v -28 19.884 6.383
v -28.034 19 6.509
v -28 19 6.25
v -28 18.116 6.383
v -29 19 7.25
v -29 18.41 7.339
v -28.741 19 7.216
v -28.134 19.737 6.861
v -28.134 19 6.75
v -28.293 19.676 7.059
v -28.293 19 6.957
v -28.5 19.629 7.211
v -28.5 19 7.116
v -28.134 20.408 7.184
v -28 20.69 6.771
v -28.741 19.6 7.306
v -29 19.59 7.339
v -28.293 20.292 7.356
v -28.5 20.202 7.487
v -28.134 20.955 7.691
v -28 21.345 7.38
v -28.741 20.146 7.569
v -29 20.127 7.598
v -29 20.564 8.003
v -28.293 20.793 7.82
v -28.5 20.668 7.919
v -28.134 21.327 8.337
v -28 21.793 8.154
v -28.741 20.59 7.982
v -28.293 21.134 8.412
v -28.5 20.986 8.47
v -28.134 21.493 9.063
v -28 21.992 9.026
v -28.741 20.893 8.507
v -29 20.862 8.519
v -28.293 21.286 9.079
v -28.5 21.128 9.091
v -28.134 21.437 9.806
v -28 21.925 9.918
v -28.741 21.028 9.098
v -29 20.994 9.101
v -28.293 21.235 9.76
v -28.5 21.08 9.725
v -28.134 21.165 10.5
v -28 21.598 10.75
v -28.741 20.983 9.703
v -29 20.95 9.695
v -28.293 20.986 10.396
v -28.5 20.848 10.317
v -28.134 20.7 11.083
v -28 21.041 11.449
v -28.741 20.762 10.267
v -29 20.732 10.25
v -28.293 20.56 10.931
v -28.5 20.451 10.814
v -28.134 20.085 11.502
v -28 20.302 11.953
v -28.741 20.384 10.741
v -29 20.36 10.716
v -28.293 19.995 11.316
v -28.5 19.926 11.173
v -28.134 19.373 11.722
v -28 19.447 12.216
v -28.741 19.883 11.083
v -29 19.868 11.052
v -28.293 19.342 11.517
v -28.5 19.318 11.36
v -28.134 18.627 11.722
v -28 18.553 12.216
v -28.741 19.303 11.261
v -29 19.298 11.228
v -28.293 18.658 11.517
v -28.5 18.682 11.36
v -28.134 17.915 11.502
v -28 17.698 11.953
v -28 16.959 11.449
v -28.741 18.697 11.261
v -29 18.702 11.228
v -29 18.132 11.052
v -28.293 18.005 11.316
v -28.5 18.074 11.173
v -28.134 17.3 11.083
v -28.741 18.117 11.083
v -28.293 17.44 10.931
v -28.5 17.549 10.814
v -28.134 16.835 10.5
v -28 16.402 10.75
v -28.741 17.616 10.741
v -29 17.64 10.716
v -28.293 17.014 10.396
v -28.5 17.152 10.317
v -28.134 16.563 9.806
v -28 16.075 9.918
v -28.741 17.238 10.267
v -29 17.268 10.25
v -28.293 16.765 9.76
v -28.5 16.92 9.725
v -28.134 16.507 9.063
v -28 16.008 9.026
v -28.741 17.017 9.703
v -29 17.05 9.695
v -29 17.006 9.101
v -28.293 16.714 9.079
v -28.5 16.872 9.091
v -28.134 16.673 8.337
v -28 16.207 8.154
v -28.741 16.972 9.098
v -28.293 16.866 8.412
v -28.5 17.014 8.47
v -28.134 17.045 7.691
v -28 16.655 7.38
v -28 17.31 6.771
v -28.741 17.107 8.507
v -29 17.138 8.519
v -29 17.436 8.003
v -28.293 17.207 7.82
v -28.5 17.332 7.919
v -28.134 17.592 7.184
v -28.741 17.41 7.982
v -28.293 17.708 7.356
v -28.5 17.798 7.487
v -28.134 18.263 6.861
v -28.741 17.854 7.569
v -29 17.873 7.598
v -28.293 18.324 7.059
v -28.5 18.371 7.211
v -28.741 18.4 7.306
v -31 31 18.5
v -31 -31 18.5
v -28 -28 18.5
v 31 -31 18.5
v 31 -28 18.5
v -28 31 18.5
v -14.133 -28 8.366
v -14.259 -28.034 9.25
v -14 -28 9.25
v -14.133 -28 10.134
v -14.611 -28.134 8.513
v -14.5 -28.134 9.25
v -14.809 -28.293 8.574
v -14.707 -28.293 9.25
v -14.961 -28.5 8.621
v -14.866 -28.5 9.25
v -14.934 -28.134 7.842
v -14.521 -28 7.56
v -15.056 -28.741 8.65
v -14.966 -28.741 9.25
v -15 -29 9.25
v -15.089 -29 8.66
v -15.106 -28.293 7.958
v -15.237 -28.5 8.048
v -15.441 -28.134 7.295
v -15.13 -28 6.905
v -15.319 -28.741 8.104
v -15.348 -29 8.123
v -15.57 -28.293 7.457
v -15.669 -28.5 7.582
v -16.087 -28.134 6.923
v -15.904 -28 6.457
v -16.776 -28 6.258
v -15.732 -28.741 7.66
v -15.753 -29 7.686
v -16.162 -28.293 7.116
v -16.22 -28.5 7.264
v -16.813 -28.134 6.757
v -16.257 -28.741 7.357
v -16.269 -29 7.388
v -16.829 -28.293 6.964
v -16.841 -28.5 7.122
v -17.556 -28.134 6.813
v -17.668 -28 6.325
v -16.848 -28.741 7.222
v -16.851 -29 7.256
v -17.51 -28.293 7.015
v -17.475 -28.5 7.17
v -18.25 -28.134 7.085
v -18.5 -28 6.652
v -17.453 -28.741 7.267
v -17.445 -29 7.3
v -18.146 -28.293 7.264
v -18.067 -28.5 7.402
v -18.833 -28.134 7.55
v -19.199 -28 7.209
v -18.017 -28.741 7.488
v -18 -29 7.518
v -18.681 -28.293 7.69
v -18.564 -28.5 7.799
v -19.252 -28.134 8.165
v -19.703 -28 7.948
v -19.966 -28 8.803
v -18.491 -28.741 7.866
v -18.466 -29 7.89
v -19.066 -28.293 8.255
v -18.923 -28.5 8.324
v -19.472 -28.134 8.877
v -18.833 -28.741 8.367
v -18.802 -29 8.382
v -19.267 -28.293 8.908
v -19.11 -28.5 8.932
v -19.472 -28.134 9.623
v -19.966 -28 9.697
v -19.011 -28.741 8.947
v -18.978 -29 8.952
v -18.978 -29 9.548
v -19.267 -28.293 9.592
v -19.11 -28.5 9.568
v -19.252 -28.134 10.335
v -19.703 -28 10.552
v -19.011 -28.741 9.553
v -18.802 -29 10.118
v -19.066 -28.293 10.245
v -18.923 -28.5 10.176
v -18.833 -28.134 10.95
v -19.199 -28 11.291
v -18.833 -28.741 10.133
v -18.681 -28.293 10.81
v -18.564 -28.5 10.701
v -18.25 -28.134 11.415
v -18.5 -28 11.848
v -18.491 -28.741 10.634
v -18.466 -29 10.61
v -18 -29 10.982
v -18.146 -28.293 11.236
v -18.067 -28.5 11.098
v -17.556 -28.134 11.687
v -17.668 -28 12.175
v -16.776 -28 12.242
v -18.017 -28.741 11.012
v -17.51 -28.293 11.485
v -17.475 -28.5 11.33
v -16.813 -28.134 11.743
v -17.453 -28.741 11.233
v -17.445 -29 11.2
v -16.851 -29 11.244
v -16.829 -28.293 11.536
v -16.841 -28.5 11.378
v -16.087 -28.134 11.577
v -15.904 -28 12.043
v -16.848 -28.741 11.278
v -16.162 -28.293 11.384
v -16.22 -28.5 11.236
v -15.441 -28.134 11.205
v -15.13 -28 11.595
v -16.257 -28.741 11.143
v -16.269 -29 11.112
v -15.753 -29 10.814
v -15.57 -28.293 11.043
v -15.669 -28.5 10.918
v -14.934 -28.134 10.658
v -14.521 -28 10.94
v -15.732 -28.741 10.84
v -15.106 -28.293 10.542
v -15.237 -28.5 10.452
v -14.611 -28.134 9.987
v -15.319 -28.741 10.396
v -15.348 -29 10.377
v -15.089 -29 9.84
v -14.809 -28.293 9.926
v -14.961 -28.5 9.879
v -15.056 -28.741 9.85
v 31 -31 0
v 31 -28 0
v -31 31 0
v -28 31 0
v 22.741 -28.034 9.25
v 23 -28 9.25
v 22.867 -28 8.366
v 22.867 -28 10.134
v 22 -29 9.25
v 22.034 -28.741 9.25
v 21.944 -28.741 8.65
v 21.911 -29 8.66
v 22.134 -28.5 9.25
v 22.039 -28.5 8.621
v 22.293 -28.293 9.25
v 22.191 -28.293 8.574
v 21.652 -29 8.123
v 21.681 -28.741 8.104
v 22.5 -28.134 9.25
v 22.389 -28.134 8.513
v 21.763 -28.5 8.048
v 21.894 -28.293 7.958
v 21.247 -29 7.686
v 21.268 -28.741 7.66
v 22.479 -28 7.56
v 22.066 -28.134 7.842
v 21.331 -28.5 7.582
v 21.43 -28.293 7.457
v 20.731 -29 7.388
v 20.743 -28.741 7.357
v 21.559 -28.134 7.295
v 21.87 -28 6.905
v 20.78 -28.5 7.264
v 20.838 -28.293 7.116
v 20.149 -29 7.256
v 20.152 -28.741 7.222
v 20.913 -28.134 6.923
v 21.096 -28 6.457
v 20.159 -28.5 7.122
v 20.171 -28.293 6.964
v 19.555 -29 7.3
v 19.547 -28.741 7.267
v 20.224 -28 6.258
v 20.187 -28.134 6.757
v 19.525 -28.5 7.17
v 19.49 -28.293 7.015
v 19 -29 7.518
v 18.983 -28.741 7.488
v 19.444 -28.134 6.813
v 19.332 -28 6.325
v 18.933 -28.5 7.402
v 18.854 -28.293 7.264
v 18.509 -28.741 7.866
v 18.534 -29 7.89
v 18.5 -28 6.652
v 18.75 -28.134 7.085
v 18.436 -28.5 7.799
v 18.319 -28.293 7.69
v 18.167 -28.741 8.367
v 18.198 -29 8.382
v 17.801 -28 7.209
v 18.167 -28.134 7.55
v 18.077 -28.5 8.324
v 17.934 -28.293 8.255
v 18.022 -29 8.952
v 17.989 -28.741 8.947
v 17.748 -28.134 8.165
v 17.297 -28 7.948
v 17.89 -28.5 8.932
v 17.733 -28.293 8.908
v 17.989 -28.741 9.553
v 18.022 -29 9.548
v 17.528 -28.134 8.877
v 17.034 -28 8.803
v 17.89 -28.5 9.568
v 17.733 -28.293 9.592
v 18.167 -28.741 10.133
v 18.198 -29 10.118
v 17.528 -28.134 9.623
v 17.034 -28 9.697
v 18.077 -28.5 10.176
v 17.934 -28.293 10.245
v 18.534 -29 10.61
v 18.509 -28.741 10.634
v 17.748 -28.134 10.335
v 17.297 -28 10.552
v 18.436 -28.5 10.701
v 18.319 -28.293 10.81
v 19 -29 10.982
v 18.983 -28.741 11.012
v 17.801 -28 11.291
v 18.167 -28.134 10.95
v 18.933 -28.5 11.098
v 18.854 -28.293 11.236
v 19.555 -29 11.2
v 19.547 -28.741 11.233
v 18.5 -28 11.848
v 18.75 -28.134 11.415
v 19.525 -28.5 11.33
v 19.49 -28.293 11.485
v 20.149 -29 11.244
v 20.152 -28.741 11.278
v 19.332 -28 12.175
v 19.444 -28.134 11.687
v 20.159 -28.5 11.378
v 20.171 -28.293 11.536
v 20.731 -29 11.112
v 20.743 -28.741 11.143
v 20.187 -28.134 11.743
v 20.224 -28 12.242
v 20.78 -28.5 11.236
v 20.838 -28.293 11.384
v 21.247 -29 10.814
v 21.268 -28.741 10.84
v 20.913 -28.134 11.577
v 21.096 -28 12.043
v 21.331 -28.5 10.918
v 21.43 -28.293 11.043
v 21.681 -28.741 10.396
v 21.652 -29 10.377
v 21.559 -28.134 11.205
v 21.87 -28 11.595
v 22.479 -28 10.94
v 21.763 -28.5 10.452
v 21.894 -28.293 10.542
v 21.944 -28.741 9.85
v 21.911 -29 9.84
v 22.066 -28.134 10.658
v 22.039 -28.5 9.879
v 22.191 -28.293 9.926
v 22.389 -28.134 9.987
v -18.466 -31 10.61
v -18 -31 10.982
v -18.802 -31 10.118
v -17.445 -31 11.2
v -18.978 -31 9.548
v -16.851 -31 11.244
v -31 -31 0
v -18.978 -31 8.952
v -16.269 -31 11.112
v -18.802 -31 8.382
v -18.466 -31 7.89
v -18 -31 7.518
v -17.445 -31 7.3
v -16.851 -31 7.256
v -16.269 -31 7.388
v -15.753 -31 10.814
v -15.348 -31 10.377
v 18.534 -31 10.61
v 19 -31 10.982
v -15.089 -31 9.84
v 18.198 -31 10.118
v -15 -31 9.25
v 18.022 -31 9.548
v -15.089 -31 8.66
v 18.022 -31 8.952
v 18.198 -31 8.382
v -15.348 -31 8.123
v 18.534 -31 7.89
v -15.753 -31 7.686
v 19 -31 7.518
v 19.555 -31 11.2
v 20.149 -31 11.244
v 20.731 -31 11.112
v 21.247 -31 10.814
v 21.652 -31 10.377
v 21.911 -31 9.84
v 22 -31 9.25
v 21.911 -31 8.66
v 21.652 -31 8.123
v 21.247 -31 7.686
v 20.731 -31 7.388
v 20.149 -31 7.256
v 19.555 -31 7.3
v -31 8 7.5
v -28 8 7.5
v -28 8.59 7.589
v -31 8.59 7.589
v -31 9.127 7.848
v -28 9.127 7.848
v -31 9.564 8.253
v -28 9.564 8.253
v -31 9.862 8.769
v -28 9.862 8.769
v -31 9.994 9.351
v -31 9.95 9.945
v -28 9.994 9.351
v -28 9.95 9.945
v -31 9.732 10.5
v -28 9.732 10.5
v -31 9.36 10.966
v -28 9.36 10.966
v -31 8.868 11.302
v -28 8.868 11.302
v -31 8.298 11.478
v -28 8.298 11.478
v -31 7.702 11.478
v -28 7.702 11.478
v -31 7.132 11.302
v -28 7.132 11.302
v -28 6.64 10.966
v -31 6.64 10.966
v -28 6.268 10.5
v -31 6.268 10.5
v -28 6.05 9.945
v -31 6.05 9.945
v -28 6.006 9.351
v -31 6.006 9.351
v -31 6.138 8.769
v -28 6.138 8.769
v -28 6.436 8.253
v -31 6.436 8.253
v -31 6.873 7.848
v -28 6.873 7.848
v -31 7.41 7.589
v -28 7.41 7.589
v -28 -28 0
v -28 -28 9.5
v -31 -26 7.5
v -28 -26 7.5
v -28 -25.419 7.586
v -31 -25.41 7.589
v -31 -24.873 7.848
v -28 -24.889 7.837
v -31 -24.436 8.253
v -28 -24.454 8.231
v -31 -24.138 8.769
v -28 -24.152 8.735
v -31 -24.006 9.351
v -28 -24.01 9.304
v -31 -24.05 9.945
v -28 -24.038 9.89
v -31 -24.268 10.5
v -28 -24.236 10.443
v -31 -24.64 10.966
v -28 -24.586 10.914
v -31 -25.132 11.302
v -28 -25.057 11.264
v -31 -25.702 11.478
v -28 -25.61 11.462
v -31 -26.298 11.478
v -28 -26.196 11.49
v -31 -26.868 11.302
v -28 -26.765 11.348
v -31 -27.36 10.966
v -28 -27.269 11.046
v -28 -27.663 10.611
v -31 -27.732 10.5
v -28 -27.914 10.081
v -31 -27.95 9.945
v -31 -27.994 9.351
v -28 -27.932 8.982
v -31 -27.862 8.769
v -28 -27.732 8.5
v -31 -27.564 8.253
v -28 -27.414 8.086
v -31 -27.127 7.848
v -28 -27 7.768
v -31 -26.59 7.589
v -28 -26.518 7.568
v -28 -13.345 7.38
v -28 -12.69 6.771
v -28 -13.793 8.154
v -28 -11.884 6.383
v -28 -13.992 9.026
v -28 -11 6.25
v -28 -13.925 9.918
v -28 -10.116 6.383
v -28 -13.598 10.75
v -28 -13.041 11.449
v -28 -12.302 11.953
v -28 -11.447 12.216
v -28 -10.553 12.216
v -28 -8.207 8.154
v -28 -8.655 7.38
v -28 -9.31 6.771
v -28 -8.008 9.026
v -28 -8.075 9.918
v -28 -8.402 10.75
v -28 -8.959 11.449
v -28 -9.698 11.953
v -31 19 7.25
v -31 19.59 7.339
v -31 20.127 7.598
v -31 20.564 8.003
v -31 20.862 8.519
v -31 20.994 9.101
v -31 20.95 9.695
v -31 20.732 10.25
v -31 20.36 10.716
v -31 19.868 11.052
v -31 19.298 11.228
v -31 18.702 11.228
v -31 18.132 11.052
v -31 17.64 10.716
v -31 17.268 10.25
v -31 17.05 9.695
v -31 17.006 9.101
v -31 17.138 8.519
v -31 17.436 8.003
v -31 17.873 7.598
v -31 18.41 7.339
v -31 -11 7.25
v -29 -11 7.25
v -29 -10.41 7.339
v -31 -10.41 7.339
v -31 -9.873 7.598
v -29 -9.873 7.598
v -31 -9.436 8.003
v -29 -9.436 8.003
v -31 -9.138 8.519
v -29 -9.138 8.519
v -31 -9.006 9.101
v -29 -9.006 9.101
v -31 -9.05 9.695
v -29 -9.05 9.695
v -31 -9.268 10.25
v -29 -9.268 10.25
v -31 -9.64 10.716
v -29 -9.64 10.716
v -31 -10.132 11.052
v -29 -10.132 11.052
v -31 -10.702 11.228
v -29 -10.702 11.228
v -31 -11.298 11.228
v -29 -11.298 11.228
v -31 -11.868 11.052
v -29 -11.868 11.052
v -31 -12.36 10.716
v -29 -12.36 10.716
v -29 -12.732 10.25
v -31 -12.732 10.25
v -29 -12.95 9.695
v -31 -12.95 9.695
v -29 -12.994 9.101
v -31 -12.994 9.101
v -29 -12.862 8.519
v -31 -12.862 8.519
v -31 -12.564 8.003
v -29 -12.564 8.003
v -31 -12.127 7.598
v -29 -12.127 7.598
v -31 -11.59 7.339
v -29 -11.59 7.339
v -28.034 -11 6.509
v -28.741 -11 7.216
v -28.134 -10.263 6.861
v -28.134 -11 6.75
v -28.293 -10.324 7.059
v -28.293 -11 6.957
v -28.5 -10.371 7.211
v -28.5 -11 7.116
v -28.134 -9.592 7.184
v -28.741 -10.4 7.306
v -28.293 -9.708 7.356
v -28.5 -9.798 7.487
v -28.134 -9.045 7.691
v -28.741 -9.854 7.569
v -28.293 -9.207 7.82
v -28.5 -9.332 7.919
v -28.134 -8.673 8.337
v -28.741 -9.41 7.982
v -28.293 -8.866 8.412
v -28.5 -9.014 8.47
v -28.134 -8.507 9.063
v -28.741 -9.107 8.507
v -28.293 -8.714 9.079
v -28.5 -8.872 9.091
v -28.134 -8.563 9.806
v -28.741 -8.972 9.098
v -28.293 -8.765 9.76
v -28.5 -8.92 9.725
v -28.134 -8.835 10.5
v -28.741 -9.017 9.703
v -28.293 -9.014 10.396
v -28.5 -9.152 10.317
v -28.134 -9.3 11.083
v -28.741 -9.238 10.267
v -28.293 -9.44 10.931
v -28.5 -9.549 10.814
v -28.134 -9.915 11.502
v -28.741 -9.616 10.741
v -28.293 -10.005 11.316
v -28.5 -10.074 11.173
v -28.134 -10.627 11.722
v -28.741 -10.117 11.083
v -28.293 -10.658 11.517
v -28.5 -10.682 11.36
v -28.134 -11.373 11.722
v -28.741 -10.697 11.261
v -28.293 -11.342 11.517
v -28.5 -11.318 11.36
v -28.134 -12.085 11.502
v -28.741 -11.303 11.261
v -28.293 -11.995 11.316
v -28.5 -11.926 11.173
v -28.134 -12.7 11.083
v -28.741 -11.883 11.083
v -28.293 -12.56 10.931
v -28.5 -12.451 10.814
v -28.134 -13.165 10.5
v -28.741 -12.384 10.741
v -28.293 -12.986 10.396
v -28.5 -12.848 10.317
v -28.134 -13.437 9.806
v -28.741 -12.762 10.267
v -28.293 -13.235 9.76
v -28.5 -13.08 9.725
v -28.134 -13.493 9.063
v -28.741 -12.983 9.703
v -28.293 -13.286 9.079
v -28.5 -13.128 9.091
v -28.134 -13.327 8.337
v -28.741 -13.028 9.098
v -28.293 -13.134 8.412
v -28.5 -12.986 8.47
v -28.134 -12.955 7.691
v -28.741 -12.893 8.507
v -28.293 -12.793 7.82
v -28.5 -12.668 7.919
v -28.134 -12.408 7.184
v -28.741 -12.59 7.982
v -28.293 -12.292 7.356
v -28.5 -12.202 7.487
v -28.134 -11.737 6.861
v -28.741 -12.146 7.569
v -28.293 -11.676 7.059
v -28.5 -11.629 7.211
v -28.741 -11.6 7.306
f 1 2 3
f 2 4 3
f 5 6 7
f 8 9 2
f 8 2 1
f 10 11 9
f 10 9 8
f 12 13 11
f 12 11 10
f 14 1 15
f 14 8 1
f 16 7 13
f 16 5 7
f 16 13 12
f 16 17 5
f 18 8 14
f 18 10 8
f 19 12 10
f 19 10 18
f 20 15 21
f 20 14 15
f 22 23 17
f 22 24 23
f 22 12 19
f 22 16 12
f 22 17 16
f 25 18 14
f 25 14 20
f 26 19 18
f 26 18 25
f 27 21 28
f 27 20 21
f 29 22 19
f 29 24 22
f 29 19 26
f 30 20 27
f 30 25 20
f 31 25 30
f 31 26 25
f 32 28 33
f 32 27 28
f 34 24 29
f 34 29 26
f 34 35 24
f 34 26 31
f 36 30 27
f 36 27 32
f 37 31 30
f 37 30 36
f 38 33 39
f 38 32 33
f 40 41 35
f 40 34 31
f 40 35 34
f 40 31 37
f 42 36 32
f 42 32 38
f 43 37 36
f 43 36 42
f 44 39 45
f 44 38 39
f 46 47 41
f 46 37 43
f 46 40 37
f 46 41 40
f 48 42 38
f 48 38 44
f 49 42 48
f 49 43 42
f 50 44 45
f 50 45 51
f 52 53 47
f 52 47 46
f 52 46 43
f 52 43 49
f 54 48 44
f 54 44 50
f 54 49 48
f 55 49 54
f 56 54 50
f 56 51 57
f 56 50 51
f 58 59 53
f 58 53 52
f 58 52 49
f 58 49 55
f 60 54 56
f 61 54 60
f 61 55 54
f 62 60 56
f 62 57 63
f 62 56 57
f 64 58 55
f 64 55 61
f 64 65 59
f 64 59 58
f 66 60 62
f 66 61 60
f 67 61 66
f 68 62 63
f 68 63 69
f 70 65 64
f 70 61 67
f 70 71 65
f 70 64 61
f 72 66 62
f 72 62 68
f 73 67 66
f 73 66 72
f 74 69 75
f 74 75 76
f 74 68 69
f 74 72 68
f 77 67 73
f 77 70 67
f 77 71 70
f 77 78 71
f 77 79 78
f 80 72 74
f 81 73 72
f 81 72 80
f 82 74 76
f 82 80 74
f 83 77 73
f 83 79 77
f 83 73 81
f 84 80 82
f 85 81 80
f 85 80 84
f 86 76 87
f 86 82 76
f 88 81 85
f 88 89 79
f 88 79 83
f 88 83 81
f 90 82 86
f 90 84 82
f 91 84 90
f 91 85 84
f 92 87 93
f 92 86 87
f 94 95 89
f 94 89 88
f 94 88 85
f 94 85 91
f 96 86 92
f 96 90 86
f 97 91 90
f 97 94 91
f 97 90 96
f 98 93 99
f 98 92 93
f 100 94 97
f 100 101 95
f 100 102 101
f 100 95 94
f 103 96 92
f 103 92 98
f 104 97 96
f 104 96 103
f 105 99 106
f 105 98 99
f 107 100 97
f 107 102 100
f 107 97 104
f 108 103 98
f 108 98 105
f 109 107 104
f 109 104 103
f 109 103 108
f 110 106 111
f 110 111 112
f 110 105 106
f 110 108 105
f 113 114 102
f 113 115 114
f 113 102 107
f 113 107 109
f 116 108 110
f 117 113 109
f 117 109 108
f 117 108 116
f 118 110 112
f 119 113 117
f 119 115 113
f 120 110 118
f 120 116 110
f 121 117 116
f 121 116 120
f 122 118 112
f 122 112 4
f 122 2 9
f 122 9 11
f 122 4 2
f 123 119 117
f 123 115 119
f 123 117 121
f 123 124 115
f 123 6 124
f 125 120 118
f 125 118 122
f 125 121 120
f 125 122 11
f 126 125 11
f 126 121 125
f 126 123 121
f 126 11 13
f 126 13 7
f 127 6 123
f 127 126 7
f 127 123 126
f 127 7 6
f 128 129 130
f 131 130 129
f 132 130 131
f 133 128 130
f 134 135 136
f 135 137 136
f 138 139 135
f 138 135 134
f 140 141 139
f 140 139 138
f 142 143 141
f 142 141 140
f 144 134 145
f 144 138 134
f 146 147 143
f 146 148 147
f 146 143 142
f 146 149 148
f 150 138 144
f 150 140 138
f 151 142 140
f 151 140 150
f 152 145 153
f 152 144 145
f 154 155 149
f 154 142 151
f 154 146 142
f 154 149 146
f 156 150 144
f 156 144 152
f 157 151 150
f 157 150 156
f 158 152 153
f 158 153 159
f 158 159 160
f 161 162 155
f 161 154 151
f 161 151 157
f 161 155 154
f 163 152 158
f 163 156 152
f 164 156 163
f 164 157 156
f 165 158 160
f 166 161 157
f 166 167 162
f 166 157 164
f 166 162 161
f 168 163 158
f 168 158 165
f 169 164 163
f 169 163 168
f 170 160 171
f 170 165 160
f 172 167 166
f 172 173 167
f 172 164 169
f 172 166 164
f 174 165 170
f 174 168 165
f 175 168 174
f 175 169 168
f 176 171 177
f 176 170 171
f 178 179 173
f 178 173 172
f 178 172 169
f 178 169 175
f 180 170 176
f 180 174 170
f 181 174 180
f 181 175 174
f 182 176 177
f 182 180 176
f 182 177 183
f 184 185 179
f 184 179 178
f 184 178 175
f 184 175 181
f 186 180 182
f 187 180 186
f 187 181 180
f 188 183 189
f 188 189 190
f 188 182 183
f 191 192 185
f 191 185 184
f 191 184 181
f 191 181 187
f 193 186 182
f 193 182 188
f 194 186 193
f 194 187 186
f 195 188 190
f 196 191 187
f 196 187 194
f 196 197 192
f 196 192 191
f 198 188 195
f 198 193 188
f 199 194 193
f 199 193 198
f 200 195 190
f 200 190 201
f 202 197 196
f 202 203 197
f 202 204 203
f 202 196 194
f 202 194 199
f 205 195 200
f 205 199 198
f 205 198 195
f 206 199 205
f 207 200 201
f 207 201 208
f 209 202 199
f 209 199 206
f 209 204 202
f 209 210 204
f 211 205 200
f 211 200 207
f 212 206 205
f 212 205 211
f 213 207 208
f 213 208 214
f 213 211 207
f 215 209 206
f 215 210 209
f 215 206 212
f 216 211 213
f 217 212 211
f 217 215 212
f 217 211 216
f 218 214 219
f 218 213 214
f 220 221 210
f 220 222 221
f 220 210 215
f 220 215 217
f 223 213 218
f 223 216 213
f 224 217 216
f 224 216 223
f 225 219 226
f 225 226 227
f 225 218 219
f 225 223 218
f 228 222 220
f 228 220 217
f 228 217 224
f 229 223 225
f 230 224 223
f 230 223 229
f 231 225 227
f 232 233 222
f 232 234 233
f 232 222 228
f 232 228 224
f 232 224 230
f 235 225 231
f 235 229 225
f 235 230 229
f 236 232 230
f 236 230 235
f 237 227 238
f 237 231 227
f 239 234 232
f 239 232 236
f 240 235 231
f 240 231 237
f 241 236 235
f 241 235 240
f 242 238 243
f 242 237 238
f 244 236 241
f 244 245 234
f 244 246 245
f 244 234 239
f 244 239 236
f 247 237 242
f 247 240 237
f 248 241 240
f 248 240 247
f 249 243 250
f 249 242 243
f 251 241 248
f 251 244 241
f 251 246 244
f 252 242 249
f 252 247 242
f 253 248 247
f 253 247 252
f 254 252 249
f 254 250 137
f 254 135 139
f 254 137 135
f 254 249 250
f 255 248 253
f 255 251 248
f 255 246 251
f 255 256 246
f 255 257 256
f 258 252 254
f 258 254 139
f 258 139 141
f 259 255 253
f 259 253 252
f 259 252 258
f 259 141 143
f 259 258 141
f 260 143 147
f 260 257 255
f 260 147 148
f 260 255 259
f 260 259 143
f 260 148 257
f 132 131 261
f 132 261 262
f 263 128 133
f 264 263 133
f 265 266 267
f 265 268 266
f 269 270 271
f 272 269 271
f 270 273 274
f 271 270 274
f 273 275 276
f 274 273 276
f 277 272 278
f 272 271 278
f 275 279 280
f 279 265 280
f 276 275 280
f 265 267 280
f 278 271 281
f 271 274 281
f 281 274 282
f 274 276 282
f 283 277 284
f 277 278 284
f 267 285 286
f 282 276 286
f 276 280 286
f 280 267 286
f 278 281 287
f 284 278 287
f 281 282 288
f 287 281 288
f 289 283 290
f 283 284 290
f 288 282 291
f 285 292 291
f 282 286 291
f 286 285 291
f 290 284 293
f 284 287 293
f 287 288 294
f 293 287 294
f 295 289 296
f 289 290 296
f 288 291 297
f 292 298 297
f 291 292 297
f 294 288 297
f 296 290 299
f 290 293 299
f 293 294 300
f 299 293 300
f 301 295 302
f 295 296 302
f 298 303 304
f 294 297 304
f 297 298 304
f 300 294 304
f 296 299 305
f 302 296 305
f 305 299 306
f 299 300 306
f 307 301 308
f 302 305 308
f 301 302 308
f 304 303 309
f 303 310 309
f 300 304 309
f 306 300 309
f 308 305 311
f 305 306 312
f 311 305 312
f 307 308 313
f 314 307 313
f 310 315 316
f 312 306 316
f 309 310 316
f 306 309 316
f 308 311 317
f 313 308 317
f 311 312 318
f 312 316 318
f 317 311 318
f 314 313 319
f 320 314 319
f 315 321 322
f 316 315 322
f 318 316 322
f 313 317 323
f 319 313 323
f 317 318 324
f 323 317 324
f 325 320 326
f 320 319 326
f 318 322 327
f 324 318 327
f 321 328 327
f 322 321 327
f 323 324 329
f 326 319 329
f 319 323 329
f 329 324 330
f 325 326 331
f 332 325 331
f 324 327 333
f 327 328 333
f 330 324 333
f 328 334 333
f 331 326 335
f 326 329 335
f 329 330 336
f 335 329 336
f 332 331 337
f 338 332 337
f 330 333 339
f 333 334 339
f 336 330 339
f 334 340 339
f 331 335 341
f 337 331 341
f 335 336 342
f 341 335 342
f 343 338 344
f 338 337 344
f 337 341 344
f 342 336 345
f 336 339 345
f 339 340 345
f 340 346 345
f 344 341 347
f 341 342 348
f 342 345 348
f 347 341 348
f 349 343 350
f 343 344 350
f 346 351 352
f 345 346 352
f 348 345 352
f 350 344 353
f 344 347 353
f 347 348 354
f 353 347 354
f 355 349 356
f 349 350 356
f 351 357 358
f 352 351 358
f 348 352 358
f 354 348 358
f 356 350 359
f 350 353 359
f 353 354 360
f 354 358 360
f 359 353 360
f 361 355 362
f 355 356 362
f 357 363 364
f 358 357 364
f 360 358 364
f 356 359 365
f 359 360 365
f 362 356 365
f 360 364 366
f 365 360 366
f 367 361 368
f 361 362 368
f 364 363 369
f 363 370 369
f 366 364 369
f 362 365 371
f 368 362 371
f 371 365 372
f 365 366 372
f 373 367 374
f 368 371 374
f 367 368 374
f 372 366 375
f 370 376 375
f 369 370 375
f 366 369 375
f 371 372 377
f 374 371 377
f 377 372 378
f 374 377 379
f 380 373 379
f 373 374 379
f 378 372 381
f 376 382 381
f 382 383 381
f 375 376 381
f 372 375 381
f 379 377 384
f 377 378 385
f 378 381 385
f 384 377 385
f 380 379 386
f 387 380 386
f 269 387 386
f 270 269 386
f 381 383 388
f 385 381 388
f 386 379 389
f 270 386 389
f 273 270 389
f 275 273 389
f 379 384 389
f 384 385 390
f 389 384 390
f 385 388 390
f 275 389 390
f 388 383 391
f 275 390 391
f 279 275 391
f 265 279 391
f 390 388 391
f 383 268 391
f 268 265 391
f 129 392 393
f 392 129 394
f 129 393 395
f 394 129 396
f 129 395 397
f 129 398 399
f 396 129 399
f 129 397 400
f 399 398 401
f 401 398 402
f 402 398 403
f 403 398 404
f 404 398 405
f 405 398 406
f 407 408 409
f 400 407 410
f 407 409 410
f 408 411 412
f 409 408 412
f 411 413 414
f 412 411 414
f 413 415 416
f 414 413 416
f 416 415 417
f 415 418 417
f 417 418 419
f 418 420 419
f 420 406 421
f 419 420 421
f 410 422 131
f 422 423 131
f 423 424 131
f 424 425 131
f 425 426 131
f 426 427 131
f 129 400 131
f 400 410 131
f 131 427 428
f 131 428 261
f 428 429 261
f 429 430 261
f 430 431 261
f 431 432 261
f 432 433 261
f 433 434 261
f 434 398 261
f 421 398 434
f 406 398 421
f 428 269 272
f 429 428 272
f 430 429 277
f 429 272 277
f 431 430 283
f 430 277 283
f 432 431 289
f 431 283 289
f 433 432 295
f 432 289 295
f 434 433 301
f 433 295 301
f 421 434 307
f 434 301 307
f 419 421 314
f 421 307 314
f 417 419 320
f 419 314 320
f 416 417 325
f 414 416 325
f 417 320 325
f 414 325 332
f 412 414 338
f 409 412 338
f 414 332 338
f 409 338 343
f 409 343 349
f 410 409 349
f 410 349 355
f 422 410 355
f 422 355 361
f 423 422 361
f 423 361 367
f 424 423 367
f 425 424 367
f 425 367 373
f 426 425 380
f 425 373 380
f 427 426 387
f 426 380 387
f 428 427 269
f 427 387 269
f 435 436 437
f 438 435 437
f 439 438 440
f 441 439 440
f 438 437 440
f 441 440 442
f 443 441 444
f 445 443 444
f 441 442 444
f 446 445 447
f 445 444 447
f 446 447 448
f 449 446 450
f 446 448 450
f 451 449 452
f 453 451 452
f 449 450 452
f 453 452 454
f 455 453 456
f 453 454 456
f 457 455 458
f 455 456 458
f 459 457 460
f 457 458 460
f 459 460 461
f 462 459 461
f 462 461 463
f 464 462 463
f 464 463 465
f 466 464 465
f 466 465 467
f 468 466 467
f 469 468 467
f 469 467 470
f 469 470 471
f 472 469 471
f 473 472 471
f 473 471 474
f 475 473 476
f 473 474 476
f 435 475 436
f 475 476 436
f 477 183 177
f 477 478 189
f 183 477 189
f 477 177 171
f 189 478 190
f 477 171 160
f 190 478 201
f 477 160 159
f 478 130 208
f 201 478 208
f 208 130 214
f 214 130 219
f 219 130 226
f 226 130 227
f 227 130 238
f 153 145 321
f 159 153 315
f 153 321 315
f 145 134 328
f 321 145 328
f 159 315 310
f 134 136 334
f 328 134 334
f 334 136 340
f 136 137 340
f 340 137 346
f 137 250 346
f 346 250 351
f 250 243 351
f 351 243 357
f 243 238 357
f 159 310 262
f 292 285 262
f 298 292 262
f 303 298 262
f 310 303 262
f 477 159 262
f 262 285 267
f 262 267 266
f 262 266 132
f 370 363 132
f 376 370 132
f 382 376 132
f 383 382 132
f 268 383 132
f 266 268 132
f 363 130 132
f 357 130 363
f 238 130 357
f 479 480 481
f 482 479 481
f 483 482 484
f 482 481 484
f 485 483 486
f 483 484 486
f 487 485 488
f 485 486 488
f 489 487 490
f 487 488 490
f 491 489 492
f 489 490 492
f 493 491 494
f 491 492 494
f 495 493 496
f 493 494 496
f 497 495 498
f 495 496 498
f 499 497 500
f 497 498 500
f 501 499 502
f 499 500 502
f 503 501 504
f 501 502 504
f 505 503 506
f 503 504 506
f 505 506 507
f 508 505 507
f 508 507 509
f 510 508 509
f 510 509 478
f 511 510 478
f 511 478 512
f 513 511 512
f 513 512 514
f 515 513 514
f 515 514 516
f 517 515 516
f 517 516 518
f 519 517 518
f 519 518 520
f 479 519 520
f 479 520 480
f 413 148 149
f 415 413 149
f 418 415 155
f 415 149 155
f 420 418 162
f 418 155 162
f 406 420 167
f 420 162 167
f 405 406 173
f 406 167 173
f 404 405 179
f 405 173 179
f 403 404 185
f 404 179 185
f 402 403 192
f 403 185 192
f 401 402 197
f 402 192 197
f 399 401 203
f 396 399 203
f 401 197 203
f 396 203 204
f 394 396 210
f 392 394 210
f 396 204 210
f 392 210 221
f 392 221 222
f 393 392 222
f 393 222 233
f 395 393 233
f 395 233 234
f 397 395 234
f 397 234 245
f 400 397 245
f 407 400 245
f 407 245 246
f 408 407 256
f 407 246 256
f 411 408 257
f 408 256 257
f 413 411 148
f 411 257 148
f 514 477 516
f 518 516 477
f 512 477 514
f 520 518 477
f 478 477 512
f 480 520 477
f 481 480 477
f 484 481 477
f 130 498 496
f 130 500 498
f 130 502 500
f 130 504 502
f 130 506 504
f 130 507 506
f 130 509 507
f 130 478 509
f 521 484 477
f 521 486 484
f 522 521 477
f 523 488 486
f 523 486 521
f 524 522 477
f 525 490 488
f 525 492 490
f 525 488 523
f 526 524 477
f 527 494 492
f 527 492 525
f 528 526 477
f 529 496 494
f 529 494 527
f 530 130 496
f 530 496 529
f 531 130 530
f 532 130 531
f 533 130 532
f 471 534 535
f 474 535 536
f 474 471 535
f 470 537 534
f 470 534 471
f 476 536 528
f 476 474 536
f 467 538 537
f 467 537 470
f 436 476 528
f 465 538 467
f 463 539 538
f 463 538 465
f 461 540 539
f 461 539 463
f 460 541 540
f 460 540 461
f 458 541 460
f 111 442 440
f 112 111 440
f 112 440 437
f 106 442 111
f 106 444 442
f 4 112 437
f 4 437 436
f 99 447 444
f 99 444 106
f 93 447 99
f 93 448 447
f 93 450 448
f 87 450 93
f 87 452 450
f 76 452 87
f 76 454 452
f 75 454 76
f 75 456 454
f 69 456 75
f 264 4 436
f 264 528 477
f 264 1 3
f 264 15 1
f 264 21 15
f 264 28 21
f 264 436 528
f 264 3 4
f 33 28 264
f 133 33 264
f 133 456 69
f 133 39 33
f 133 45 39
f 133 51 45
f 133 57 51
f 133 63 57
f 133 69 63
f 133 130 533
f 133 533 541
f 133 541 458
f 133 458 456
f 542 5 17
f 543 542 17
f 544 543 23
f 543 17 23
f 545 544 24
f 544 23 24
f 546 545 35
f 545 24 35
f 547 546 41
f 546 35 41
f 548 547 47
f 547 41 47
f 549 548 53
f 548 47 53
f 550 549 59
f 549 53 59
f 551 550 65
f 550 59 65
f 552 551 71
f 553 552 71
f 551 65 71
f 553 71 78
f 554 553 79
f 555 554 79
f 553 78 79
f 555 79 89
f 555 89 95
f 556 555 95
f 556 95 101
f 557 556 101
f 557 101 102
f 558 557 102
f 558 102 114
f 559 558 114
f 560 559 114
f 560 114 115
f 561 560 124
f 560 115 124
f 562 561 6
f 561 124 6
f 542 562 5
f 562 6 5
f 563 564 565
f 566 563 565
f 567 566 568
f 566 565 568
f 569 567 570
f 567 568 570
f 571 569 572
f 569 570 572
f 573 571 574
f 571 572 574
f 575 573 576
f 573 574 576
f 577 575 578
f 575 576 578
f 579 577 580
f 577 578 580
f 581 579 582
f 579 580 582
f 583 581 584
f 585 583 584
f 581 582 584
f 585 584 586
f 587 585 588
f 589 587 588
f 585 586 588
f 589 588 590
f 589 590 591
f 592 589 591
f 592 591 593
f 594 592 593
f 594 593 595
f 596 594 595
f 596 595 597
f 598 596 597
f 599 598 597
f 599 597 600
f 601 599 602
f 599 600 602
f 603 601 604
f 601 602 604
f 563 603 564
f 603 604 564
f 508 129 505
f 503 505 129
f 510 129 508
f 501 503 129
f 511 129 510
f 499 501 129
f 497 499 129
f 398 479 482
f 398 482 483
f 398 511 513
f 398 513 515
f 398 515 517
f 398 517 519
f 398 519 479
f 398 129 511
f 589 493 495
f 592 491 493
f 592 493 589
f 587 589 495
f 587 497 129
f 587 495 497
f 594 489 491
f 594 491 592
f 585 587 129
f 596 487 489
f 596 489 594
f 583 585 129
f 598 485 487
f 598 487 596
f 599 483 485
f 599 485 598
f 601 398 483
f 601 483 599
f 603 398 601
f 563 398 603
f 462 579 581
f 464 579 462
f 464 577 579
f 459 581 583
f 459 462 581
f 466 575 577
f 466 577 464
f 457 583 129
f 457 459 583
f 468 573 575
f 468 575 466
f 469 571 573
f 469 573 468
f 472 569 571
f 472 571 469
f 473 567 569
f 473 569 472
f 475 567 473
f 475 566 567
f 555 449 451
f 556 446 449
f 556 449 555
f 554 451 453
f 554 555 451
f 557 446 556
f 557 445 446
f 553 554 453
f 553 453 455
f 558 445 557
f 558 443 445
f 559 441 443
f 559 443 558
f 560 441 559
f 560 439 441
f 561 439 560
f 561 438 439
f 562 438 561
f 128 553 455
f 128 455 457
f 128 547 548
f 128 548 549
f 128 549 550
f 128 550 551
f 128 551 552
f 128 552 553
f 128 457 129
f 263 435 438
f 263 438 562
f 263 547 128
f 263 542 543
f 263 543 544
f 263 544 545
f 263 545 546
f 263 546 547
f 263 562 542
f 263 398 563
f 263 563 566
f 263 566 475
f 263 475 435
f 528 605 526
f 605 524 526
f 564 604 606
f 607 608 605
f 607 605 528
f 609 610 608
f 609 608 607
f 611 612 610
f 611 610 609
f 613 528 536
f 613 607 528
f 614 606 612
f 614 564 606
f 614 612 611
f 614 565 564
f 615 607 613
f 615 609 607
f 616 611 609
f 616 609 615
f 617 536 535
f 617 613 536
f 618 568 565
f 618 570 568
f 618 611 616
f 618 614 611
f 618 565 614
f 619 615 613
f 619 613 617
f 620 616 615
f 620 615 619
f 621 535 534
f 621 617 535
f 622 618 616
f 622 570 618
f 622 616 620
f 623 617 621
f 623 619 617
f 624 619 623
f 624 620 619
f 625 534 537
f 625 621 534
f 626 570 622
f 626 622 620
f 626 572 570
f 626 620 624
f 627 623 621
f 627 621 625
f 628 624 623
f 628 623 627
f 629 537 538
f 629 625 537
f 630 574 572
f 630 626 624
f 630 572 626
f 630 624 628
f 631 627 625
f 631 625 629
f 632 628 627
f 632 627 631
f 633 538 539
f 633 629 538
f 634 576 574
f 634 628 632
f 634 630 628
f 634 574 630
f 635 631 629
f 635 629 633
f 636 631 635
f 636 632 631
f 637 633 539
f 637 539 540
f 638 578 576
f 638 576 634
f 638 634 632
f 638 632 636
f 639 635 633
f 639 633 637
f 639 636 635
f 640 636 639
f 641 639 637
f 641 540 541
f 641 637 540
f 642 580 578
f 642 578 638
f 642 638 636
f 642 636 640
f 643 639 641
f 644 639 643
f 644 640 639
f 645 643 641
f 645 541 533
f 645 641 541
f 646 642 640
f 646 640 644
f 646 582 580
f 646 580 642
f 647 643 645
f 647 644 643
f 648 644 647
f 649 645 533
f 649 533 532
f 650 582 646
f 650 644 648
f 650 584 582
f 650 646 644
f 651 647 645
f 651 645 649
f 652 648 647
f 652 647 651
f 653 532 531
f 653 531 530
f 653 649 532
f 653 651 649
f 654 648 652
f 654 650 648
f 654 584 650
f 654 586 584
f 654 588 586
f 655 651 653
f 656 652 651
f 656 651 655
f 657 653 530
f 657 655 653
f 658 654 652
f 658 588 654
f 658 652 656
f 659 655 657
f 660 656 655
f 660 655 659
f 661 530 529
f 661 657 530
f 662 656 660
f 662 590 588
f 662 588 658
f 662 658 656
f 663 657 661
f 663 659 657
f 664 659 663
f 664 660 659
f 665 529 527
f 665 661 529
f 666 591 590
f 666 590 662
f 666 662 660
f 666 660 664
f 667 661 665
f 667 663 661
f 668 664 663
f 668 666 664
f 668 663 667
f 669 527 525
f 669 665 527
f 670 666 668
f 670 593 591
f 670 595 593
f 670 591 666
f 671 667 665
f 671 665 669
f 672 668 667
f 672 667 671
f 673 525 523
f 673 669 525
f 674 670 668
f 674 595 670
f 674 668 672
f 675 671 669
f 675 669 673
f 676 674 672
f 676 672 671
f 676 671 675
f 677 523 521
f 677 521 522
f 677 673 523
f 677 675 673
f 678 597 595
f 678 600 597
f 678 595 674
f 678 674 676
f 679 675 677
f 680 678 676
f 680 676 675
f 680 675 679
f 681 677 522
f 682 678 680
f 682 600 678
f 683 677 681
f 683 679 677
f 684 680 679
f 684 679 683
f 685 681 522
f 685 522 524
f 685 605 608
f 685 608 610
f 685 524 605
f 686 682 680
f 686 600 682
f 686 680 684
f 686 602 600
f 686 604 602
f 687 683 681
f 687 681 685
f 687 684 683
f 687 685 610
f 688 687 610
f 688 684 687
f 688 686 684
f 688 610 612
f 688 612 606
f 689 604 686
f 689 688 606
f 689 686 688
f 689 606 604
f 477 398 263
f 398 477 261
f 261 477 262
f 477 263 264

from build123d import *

# Parameters (mm, degrees)
SKETCH1_W           = 62
SKETCH1_H           = 62
BOSS_EXTRUDE1_DEPTH = 18.5
SKETCH2_W           = 59
SKETCH2_H           = 59
CUT_EXTRUDE1_DEPTH  = 18.5
SKETCH3_R           = 2
CUT_EXTRUDE2_DEPTH  = 3
SKETCH4_R           = 2
CUT_EXTRUDE3_DEPTH  = 3
FILLET1_R           = 1
FILLET2_R           = 1
SKETCH5_R           = 2
CUT_EXTRUDE4_DEPTH  = 3
SKETCH6_R           = 2
CUT_EXTRUDE5_DEPTH  = 3
FILLET3_R           = 1
FILLET4_R           = 1
SKETCH7_R           = 2
CUT_EXTRUDE6_DEPTH  = 3
SKETCH8_R           = 2
CUT_EXTRUDE7_DEPTH  = 3


with BuildPart() as part:
    # Sketch1 → Boss-Extrude1 (new body)
    with BuildSketch(Plane.XY):
        Rectangle(SKETCH1_W, SKETCH1_H)
    extrude(amount=BOSS_EXTRUDE1_DEPTH)

    # Sketch2 → Cut-Extrude1 (cut)
    with BuildSketch(Plane.XY.offset(18.5)):
        with Locations((1.5, 1.5)):
            Rectangle(SKETCH2_W, SKETCH2_H)
    extrude(amount=-CUT_EXTRUDE1_DEPTH, mode=Mode.SUBTRACT)

    # Sketch3 → Cut-Extrude2 (cut)
    with BuildSketch(Plane(origin=(0, -28, 0), x_dir=(1, 0, 0), z_dir=(0, 1, 0))):
        with Locations((-17, -9.25)):
            Circle(SKETCH3_R)
    extrude(amount=-CUT_EXTRUDE2_DEPTH, mode=Mode.SUBTRACT)

    # Sketch4 → Cut-Extrude3 (cut)
    with BuildSketch(Plane(origin=(0, -28, 0), x_dir=(1, 0, 0), z_dir=(0, 1, 0))):
        with Locations((20, -9.25)):
            Circle(SKETCH4_R)
    extrude(amount=-CUT_EXTRUDE3_DEPTH, mode=Mode.SUBTRACT)

    # Fillet1
    fillet1_edges = [part.edges().sort_by_distance(p)[0] for p in [
        (18, -28, 9.25),
    ]]
    fillet(fillet1_edges, radius=FILLET1_R)

    # Fillet2
    fillet2_edges = [part.edges().sort_by_distance(p)[0] for p in [
        (-19, -28, 9.25),
    ]]
    fillet(fillet2_edges, radius=FILLET2_R)

    # Sketch5 → Cut-Extrude4 (cut)
    with BuildSketch(Plane(origin=(-28, 0, 0), x_dir=(0, 0, -1), z_dir=(1, 0, 0))):
        with Locations((-9.25, -11)):
            Circle(SKETCH5_R)
    extrude(amount=-CUT_EXTRUDE4_DEPTH, mode=Mode.SUBTRACT)

    # Sketch6 → Cut-Extrude5 (cut)
    with BuildSketch(Plane(origin=(-28, 0, 0), x_dir=(0, 0, -1), z_dir=(1, 0, 0))):
        with Locations((-9.25, 19)):
            Circle(SKETCH6_R)
    extrude(amount=-CUT_EXTRUDE5_DEPTH, mode=Mode.SUBTRACT)

    # Fillet3
    fillet3_edges = [part.edges().sort_by_distance(p)[0] for p in [
        (-28, 19, 11.25),
    ]]
    fillet(fillet3_edges, radius=FILLET3_R)

    # Fillet4
    fillet4_edges = [part.edges().sort_by_distance(p)[0] for p in [
        (-28, -11, 11.25),
    ]]
    fillet(fillet4_edges, radius=FILLET4_R)

    # Sketch7 → Cut-Extrude6 (cut)
    with BuildSketch(Plane(origin=(-28, 0, 0), x_dir=(0, 0, -1), z_dir=(1, 0, 0))):
        with Locations((-9.5, -26)):
            Circle(SKETCH7_R)
    extrude(amount=-CUT_EXTRUDE6_DEPTH, mode=Mode.SUBTRACT)

    # Sketch8 → Cut-Extrude7 (cut)
    with BuildSketch(Plane(origin=(-28, 0, 0), x_dir=(0, 0, -1), z_dir=(1, 0, 0))):
        with Locations((-9.5, 8)):
            Circle(SKETCH8_R)
    extrude(amount=-CUT_EXTRUDE7_DEPTH, mode=Mode.SUBTRACT)


solid = part.part
